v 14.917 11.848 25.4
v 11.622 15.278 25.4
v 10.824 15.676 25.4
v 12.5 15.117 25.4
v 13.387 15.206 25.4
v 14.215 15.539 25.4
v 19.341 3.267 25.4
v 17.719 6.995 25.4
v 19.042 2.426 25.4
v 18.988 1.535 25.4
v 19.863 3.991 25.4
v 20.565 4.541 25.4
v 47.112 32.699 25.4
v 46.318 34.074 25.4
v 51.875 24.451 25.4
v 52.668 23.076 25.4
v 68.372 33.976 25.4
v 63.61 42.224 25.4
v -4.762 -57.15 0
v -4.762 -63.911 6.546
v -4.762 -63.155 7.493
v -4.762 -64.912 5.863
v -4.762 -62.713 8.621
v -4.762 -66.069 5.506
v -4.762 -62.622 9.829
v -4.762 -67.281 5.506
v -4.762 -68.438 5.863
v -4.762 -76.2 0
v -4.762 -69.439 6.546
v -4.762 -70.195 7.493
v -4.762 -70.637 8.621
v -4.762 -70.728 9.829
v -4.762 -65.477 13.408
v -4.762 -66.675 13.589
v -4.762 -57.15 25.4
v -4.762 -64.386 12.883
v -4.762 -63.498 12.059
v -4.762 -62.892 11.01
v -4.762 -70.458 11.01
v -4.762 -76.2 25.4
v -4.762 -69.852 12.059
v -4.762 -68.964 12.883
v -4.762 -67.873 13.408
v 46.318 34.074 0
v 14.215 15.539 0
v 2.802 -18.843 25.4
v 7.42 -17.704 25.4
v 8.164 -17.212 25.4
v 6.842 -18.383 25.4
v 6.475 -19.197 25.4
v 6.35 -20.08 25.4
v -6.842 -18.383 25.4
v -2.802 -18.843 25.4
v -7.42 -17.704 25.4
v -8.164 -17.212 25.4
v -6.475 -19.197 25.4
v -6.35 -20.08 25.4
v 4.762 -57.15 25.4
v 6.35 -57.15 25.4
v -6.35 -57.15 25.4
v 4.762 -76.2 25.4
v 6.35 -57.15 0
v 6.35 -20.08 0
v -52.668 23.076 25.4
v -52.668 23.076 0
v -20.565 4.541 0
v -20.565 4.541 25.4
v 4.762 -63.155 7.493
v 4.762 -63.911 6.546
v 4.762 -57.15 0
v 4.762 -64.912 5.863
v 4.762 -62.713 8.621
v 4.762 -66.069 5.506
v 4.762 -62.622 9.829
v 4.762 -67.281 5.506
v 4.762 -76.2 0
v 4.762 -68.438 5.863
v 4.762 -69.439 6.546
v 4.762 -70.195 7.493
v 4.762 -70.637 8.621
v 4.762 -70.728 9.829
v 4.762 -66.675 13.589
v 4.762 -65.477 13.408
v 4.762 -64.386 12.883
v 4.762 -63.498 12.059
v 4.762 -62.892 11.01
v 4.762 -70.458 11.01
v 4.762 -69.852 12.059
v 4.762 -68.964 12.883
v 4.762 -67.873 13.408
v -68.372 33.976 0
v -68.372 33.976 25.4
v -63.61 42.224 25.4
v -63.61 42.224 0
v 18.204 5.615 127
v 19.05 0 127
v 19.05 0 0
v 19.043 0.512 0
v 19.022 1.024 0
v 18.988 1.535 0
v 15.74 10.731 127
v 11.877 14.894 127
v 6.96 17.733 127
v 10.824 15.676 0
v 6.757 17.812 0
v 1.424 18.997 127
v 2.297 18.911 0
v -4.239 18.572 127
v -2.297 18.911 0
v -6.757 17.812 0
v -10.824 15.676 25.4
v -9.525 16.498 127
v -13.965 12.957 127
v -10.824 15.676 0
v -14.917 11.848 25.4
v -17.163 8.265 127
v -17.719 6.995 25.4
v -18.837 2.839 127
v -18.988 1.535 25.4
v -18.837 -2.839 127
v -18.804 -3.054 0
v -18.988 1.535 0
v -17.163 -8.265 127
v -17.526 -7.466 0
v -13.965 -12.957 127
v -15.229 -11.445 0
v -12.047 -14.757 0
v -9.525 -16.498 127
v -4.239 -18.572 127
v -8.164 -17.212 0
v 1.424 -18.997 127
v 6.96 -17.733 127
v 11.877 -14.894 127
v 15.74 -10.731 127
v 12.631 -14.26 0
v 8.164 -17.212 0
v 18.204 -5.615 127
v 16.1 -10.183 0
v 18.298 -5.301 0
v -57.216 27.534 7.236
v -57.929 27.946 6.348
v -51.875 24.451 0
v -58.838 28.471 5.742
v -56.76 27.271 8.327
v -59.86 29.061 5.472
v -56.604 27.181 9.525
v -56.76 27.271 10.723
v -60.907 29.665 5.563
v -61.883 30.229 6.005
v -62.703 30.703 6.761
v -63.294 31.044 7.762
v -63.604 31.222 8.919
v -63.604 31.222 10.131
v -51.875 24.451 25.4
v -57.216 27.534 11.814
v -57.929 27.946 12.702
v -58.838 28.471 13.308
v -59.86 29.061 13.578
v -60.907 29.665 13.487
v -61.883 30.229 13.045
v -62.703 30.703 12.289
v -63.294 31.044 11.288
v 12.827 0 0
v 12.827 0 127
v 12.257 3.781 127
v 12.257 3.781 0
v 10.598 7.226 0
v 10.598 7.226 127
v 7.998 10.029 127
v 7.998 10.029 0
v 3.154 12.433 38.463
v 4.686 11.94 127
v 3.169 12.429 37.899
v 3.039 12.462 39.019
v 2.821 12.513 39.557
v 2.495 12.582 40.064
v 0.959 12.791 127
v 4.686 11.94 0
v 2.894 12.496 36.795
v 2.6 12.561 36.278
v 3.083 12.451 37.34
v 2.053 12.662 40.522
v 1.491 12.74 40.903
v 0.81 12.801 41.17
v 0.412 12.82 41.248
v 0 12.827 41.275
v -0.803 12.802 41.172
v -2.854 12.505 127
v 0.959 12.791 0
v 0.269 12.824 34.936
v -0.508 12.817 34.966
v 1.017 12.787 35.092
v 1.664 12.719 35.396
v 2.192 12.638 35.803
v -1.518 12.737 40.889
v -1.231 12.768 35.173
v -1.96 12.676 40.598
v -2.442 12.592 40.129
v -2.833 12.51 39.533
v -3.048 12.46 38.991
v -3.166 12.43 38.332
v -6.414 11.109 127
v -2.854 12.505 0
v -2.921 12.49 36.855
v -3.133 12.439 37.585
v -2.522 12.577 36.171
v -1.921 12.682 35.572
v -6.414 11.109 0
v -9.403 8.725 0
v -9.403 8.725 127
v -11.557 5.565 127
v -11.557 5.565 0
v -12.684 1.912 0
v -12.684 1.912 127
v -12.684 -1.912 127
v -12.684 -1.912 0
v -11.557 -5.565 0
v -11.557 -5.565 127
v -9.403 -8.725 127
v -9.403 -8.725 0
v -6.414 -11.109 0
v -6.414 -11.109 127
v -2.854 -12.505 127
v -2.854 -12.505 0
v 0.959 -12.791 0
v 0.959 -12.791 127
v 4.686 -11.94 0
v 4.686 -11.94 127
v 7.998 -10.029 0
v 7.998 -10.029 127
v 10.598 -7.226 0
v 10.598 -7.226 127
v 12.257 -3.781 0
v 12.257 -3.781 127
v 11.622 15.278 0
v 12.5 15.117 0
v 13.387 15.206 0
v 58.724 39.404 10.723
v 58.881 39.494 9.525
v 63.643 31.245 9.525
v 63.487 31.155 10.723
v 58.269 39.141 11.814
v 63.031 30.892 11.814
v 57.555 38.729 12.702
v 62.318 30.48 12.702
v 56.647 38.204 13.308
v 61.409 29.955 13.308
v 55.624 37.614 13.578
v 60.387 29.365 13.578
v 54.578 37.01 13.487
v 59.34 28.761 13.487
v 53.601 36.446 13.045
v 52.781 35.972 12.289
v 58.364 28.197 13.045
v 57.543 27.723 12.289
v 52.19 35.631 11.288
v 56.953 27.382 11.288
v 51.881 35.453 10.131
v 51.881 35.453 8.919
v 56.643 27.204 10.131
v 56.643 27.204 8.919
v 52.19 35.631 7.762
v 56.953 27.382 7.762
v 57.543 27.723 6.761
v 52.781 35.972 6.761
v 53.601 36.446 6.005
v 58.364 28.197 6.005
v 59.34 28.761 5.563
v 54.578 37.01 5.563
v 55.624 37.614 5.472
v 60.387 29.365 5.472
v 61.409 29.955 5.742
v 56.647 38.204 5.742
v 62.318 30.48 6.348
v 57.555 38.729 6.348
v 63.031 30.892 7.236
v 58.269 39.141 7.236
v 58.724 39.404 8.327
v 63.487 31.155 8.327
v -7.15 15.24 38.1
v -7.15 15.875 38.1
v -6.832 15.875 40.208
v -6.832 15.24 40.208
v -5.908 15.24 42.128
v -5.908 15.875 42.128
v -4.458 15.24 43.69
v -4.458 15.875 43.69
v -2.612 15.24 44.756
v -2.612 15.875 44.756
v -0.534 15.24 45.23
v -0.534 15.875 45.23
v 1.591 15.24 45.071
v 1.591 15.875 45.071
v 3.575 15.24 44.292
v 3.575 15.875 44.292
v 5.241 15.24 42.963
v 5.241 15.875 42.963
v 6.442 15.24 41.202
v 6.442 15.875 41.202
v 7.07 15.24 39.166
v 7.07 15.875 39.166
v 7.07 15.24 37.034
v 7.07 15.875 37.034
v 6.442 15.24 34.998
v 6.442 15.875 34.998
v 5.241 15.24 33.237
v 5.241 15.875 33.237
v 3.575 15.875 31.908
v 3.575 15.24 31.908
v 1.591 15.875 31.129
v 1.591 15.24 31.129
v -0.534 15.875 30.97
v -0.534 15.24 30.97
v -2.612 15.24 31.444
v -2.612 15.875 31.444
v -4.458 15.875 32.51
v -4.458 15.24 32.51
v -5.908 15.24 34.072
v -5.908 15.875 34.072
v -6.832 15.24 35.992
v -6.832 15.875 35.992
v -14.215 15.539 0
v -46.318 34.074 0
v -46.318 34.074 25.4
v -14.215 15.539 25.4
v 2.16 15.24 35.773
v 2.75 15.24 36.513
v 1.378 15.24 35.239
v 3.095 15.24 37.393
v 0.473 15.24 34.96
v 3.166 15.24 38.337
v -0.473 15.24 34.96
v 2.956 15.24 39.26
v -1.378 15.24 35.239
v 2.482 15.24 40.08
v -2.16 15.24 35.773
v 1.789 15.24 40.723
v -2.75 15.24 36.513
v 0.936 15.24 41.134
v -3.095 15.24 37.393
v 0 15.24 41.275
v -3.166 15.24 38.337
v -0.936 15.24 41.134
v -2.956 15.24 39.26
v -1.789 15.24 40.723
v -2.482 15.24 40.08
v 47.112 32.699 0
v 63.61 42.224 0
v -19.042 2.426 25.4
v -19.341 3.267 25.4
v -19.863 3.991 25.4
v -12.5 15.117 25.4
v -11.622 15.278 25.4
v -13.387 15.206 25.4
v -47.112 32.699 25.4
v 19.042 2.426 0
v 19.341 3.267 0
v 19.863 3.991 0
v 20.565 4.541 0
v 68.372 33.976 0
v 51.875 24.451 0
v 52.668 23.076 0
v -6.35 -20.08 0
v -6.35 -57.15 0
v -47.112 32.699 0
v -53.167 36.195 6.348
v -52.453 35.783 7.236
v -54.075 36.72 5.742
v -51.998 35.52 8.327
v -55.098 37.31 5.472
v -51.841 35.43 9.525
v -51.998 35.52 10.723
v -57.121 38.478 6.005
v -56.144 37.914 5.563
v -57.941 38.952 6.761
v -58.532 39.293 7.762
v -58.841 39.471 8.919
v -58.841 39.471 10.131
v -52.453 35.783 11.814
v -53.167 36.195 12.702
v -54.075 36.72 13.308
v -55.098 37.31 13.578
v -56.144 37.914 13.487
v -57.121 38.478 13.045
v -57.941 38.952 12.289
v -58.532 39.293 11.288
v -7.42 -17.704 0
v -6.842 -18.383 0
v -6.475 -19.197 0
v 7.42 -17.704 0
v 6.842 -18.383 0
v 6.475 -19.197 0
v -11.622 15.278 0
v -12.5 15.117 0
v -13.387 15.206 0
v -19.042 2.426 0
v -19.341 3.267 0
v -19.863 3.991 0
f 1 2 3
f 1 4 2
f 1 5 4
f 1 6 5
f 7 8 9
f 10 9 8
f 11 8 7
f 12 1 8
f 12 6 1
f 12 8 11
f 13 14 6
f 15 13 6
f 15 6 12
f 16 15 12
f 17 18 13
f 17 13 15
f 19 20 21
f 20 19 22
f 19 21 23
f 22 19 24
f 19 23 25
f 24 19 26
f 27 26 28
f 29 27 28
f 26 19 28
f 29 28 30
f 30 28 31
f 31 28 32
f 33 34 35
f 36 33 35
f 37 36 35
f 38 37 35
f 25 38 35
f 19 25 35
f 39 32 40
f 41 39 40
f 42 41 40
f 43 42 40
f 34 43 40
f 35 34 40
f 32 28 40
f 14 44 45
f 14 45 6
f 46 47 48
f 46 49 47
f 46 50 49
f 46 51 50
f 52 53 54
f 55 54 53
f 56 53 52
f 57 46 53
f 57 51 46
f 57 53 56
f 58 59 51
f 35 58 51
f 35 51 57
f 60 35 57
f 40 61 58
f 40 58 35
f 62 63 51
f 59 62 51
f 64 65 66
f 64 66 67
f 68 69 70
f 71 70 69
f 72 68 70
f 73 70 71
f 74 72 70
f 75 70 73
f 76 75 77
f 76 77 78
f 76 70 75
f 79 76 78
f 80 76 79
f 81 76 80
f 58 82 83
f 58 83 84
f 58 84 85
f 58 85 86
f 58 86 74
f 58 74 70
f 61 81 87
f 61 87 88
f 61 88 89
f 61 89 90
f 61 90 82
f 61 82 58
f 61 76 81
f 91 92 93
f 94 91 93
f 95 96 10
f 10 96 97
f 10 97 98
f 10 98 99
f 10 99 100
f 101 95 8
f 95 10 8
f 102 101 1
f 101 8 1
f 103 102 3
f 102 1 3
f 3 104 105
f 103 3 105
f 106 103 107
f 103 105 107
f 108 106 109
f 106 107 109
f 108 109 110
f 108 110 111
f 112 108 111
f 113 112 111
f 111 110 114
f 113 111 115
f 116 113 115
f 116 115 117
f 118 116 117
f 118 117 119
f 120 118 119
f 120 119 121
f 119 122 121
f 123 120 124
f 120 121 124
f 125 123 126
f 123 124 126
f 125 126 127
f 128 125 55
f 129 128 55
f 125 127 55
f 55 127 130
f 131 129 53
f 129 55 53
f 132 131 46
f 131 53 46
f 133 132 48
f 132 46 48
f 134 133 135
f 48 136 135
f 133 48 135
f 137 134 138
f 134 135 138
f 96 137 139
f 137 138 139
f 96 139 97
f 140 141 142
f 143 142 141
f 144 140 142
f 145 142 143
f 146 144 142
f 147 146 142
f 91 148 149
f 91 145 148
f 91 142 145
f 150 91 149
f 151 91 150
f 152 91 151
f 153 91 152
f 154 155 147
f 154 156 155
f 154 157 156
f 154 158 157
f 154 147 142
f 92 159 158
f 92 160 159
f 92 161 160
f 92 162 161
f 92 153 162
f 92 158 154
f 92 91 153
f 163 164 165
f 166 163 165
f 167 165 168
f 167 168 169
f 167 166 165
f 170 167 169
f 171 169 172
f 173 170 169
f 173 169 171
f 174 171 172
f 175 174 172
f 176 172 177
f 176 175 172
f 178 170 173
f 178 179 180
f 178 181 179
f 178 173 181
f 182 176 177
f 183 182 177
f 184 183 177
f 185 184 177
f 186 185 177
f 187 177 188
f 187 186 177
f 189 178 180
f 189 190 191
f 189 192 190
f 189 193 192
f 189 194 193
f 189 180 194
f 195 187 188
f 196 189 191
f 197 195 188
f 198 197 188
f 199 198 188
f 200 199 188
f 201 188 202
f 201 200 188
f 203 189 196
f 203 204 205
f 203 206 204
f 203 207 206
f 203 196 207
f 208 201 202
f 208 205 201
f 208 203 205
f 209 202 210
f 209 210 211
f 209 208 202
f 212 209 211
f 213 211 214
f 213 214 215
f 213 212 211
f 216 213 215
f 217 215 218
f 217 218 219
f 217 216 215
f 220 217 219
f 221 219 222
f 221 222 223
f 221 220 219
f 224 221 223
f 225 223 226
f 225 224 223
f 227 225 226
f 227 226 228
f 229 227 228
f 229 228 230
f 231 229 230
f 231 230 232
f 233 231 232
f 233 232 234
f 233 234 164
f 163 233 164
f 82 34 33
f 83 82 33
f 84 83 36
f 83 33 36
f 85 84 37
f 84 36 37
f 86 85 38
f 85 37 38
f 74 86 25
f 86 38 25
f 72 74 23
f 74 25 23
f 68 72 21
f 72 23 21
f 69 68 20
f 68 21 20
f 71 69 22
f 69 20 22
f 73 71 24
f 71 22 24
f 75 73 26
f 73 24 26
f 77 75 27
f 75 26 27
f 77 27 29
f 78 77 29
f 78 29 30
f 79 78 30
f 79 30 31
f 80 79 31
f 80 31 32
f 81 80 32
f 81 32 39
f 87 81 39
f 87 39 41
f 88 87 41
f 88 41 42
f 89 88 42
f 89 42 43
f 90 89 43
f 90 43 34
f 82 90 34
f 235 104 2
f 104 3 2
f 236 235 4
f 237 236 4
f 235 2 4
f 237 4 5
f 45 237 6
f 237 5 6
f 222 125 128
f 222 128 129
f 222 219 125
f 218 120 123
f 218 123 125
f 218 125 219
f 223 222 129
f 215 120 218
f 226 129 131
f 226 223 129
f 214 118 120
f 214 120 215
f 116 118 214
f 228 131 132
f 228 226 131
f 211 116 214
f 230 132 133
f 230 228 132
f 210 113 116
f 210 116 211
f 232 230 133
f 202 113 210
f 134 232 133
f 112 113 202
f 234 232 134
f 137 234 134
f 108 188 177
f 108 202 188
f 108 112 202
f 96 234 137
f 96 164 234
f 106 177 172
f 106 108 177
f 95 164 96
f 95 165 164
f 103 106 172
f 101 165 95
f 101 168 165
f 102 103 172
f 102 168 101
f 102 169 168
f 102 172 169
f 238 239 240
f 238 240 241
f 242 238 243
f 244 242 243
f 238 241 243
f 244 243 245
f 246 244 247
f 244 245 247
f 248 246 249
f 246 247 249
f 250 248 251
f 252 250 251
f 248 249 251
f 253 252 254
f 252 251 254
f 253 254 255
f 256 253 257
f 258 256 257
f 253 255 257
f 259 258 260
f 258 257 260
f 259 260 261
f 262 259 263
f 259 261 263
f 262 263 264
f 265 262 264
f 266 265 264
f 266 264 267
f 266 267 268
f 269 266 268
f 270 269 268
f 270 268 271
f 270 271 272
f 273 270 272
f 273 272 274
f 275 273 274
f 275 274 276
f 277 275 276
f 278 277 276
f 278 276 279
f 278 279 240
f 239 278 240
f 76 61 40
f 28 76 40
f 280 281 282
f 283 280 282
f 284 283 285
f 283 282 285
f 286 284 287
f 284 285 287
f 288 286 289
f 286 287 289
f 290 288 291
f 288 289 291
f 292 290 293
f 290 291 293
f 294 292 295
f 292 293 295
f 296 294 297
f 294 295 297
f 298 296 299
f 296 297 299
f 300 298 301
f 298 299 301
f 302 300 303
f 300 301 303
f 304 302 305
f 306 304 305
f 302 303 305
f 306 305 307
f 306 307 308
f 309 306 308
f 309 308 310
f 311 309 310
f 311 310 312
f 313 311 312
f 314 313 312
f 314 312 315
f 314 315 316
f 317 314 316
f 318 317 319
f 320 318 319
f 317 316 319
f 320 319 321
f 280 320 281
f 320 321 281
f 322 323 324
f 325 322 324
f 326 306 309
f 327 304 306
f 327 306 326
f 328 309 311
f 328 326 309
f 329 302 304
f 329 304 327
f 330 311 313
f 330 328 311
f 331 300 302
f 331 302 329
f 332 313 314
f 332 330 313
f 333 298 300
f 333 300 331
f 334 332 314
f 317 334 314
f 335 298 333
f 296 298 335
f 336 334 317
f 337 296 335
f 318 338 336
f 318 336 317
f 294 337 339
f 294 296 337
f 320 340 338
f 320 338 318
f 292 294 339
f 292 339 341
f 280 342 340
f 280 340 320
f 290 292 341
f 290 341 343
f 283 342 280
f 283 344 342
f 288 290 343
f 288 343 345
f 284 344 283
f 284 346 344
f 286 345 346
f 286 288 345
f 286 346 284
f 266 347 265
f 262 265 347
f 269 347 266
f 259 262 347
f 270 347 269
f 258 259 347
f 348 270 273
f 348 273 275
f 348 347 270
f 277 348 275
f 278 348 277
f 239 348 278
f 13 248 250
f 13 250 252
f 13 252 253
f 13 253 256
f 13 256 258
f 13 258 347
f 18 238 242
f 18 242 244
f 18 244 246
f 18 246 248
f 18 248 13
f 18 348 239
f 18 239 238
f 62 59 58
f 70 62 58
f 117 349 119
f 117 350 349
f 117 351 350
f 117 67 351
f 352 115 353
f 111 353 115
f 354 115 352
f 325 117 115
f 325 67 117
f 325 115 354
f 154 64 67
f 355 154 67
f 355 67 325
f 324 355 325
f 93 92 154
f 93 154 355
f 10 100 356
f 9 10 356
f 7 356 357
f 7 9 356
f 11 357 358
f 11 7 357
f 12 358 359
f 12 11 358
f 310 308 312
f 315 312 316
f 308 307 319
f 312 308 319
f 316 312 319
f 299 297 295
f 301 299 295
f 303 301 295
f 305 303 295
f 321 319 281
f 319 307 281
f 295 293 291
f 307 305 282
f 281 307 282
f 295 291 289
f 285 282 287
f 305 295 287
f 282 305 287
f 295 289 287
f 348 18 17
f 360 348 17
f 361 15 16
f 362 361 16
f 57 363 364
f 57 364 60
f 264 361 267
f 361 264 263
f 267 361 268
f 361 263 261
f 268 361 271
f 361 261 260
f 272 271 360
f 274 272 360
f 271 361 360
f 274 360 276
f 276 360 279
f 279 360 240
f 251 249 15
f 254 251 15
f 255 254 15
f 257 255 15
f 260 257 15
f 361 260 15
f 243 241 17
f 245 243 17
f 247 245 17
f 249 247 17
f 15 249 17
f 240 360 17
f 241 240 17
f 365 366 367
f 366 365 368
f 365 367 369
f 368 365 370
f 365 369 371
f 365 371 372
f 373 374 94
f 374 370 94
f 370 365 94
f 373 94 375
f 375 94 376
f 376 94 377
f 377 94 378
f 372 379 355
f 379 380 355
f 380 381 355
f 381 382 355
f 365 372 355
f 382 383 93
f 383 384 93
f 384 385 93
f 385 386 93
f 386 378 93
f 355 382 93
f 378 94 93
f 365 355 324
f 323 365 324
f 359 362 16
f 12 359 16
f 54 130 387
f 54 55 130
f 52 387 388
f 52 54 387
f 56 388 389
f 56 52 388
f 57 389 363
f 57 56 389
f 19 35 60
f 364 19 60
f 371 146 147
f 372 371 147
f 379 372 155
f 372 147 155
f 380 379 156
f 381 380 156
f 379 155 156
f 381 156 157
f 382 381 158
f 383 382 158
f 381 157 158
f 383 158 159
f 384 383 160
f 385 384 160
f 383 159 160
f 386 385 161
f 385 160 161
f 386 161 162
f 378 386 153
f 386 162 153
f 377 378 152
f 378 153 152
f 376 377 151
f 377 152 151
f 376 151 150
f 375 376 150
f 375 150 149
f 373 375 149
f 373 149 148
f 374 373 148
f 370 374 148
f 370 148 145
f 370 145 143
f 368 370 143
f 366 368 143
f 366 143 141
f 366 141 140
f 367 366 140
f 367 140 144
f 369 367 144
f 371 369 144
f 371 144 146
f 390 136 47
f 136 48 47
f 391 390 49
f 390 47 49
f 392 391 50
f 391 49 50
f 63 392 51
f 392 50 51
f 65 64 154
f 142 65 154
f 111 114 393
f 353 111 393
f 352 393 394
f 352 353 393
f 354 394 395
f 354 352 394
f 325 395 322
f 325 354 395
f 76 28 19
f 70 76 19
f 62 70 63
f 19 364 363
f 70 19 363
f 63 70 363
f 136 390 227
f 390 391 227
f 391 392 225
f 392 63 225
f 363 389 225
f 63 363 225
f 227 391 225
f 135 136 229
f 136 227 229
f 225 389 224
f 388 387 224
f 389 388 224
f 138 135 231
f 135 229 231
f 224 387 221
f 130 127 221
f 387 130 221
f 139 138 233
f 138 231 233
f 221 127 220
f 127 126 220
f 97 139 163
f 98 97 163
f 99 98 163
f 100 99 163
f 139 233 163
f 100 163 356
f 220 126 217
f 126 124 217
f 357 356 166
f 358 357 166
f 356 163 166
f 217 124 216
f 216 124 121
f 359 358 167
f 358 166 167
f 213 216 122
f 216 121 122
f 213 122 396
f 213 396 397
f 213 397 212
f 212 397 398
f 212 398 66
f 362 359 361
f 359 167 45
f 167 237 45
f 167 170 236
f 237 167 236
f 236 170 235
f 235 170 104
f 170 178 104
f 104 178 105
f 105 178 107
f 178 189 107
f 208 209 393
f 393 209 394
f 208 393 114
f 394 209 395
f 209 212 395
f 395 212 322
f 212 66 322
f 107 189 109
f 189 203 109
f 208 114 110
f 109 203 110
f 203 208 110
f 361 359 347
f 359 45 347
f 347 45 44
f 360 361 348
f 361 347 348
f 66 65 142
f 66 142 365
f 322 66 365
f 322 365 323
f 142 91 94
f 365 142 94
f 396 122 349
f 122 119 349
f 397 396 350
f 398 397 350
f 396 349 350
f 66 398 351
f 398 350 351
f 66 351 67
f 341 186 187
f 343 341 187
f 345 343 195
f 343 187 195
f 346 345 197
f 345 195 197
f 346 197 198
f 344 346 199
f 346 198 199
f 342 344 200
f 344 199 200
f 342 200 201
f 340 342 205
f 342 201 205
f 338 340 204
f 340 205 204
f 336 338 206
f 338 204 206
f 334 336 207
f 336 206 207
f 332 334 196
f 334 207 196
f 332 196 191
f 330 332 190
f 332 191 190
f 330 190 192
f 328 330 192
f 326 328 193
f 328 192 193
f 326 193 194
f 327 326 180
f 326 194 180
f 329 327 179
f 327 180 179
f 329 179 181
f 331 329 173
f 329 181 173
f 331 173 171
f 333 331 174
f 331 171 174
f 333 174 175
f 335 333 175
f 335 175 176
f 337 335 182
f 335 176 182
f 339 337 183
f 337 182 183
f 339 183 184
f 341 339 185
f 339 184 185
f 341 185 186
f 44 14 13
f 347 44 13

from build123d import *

# Parameters (mm, degrees)
SKETCH1_R           = 19.05
SKETCH1_R_2         = 12.827
BASE_EXTRUDE_DEPTH  = 127
SKETCH2_W           = 9.525
SKETCH2_H           = 25.4
BOSS_EXTRUDE1_DEPTH = 57.754917
SKETCH3_R           = 4.064
CUT_EXTRUDE1_DEPTH  = 24.8125
CIRPATTERN1_COUNT   = 3
SKETCH6_R           = 4.064
CUT_EXTRUDE2_DEPTH  = 76.516135768
SKETCH7_R           = 4.064
CUT_EXTRUDE3_DEPTH  = 76.516135768
SKETCH10_R          = 7.1501
CUT_EXTRUDE4_DEPTH  = 0.635
SKETCH13_W          = 12.7
SKETCH13_H          = 25.4
BOSS_EXTRUDE3_DEPTH = 39.189488
CIRPATTERN2_COUNT   = 3
FILLET1_R           = 3.175
FILLET2_R           = 3.175
FILLET3_R           = 3.175


with BuildPart() as part:
    # Sketch1 → Base-Extrude (new body)
    with BuildSketch(Plane.XY):
        Circle(SKETCH1_R)
        Circle(SKETCH1_R_2, mode=Mode.SUBTRACT)
    extrude(amount=BASE_EXTRUDE_DEPTH)

    # Sketch2 → Boss-Extrude1 (add)
    with BuildSketch(Plane(origin=(0, -76.2, 0), x_dir=(-1, 0, 0), z_dir=(0, 1, 0))):
        with Locations((0, 12.7)):
            Rectangle(SKETCH2_W, SKETCH2_H)
    boss_extrude1 = extrude(amount=BOSS_EXTRUDE1_DEPTH)

    # Sketch3 → Cut-Extrude1 (cut, through all)
    with BuildSketch(Plane.ZY.offset(4.7625)):
        with Locations((9.525, -66.675)):
            Circle(SKETCH3_R)
    extrude(amount=-CUT_EXTRUDE1_DEPTH, mode=Mode.SUBTRACT)

    # CirPattern1: Boss-Extrude1 ×3 about axis
    cirpattern1_axis = Axis((0, 0, 0), (0, 0, 1))
    for i in range(1, CIRPATTERN1_COUNT):
        add(boss_extrude1.rotate(cirpattern1_axis, i * 360 / CIRPATTERN1_COUNT))

    # Sketch6 → Cut-Extrude2 (cut, through all)
    with BuildSketch(Plane(origin=(-45.618861607, 20.838800715, 50.936831184), x_dir=(0.866025404, -0.5, 0), z_dir=(-0.5, -0.866025404, 0))):
        with Locations((-16.748506599, -41.411831184)):
            Circle(SKETCH6_R)
    extrude(amount=-CUT_EXTRUDE2_DEPTH, mode=Mode.SUBTRACT)

    # Sketch7 → Cut-Extrude3 (cut, through all)
    with BuildSketch(Plane(origin=(34.377585278, 14.3486468, 49.693003082), x_dir=(0.866025404, 0.5, 0), z_dir=(0.5, -0.866025404, 0))):
        with Locations((29.728814428, -40.168003082)):
            Circle(SKETCH7_R)
    extrude(amount=-CUT_EXTRUDE3_DEPTH, mode=Mode.SUBTRACT)

    # Sketch10 → Cut-Extrude4 (cut)
    with BuildSketch(Plane(origin=(0, 15.875, 0), x_dir=(-1, 0, 0), z_dir=(0, 1, 0))):
        with Locations((0, 38.1)):
            Circle(SKETCH10_R)
    extrude(amount=-CUT_EXTRUDE4_DEPTH, mode=Mode.SUBTRACT)

    # Sketch12 → Hole2 (revolve, cut)
    with BuildSketch(Plane(origin=(0, 15.24, 38.1), x_dir=(0, 0, 1), z_dir=(1, 0, 0))):
        Polygon((0, 0), (0, 14.233804302), (2.552697789, 12.699989), (2.552697789, 9.52499175), (3.17499725, 9.52499175), (3.17499725, 0.002539998), (3.17499725, 0), align=None)
    revolve(axis=Axis((0, 15.24, 38.1), (0, -1, 0)), mode=Mode.SUBTRACT)

    # Sketch13 → Boss-Extrude3 (add)
    with BuildSketch(Plane(origin=(0, -57.15, 0), x_dir=(-1, 0, 0), z_dir=(0, 1, 0))):
        with Locations((0, 12.7)):
            Rectangle(SKETCH13_W, SKETCH13_H)
    boss_extrude3 = extrude(amount=BOSS_EXTRUDE3_DEPTH)

    # CirPattern2: Boss-Extrude3 ×3 about axis
    cirpattern2_axis = Axis((0, 0, 0), (0, 0, 1))
    for i in range(1, CIRPATTERN2_COUNT):
        add(boss_extrude3.rotate(cirpattern2_axis, i * 360 / CIRPATTERN2_COUNT))

    # Fillet1
    fillet1_edges = [part.edges().sort_by_distance(p)[0] for p in [
        (-12.379259657, 14.479517314, 12.7),
        (12.379259657, 14.479517314, 12.7),
    ]]
    fillet(fillet1_edges, radius=FILLET1_R)

    # Fillet2
    fillet2_edges = [part.edges().sort_by_distance(p)[0] for p in [
        (-18.729259657, 3.480994686, 12.7),
        (-6.35, -17.960512, 12.7),
    ]]
    fillet(fillet2_edges, radius=FILLET2_R)

    # Fillet3
    fillet3_edges = [part.edges().sort_by_distance(p)[0] for p in [
        (18.729259657, 3.480994686, 12.7),
        (6.35, -17.960512, 12.7),
    ]]
    fillet(fillet3_edges, radius=FILLET3_R)


solid = part.part
